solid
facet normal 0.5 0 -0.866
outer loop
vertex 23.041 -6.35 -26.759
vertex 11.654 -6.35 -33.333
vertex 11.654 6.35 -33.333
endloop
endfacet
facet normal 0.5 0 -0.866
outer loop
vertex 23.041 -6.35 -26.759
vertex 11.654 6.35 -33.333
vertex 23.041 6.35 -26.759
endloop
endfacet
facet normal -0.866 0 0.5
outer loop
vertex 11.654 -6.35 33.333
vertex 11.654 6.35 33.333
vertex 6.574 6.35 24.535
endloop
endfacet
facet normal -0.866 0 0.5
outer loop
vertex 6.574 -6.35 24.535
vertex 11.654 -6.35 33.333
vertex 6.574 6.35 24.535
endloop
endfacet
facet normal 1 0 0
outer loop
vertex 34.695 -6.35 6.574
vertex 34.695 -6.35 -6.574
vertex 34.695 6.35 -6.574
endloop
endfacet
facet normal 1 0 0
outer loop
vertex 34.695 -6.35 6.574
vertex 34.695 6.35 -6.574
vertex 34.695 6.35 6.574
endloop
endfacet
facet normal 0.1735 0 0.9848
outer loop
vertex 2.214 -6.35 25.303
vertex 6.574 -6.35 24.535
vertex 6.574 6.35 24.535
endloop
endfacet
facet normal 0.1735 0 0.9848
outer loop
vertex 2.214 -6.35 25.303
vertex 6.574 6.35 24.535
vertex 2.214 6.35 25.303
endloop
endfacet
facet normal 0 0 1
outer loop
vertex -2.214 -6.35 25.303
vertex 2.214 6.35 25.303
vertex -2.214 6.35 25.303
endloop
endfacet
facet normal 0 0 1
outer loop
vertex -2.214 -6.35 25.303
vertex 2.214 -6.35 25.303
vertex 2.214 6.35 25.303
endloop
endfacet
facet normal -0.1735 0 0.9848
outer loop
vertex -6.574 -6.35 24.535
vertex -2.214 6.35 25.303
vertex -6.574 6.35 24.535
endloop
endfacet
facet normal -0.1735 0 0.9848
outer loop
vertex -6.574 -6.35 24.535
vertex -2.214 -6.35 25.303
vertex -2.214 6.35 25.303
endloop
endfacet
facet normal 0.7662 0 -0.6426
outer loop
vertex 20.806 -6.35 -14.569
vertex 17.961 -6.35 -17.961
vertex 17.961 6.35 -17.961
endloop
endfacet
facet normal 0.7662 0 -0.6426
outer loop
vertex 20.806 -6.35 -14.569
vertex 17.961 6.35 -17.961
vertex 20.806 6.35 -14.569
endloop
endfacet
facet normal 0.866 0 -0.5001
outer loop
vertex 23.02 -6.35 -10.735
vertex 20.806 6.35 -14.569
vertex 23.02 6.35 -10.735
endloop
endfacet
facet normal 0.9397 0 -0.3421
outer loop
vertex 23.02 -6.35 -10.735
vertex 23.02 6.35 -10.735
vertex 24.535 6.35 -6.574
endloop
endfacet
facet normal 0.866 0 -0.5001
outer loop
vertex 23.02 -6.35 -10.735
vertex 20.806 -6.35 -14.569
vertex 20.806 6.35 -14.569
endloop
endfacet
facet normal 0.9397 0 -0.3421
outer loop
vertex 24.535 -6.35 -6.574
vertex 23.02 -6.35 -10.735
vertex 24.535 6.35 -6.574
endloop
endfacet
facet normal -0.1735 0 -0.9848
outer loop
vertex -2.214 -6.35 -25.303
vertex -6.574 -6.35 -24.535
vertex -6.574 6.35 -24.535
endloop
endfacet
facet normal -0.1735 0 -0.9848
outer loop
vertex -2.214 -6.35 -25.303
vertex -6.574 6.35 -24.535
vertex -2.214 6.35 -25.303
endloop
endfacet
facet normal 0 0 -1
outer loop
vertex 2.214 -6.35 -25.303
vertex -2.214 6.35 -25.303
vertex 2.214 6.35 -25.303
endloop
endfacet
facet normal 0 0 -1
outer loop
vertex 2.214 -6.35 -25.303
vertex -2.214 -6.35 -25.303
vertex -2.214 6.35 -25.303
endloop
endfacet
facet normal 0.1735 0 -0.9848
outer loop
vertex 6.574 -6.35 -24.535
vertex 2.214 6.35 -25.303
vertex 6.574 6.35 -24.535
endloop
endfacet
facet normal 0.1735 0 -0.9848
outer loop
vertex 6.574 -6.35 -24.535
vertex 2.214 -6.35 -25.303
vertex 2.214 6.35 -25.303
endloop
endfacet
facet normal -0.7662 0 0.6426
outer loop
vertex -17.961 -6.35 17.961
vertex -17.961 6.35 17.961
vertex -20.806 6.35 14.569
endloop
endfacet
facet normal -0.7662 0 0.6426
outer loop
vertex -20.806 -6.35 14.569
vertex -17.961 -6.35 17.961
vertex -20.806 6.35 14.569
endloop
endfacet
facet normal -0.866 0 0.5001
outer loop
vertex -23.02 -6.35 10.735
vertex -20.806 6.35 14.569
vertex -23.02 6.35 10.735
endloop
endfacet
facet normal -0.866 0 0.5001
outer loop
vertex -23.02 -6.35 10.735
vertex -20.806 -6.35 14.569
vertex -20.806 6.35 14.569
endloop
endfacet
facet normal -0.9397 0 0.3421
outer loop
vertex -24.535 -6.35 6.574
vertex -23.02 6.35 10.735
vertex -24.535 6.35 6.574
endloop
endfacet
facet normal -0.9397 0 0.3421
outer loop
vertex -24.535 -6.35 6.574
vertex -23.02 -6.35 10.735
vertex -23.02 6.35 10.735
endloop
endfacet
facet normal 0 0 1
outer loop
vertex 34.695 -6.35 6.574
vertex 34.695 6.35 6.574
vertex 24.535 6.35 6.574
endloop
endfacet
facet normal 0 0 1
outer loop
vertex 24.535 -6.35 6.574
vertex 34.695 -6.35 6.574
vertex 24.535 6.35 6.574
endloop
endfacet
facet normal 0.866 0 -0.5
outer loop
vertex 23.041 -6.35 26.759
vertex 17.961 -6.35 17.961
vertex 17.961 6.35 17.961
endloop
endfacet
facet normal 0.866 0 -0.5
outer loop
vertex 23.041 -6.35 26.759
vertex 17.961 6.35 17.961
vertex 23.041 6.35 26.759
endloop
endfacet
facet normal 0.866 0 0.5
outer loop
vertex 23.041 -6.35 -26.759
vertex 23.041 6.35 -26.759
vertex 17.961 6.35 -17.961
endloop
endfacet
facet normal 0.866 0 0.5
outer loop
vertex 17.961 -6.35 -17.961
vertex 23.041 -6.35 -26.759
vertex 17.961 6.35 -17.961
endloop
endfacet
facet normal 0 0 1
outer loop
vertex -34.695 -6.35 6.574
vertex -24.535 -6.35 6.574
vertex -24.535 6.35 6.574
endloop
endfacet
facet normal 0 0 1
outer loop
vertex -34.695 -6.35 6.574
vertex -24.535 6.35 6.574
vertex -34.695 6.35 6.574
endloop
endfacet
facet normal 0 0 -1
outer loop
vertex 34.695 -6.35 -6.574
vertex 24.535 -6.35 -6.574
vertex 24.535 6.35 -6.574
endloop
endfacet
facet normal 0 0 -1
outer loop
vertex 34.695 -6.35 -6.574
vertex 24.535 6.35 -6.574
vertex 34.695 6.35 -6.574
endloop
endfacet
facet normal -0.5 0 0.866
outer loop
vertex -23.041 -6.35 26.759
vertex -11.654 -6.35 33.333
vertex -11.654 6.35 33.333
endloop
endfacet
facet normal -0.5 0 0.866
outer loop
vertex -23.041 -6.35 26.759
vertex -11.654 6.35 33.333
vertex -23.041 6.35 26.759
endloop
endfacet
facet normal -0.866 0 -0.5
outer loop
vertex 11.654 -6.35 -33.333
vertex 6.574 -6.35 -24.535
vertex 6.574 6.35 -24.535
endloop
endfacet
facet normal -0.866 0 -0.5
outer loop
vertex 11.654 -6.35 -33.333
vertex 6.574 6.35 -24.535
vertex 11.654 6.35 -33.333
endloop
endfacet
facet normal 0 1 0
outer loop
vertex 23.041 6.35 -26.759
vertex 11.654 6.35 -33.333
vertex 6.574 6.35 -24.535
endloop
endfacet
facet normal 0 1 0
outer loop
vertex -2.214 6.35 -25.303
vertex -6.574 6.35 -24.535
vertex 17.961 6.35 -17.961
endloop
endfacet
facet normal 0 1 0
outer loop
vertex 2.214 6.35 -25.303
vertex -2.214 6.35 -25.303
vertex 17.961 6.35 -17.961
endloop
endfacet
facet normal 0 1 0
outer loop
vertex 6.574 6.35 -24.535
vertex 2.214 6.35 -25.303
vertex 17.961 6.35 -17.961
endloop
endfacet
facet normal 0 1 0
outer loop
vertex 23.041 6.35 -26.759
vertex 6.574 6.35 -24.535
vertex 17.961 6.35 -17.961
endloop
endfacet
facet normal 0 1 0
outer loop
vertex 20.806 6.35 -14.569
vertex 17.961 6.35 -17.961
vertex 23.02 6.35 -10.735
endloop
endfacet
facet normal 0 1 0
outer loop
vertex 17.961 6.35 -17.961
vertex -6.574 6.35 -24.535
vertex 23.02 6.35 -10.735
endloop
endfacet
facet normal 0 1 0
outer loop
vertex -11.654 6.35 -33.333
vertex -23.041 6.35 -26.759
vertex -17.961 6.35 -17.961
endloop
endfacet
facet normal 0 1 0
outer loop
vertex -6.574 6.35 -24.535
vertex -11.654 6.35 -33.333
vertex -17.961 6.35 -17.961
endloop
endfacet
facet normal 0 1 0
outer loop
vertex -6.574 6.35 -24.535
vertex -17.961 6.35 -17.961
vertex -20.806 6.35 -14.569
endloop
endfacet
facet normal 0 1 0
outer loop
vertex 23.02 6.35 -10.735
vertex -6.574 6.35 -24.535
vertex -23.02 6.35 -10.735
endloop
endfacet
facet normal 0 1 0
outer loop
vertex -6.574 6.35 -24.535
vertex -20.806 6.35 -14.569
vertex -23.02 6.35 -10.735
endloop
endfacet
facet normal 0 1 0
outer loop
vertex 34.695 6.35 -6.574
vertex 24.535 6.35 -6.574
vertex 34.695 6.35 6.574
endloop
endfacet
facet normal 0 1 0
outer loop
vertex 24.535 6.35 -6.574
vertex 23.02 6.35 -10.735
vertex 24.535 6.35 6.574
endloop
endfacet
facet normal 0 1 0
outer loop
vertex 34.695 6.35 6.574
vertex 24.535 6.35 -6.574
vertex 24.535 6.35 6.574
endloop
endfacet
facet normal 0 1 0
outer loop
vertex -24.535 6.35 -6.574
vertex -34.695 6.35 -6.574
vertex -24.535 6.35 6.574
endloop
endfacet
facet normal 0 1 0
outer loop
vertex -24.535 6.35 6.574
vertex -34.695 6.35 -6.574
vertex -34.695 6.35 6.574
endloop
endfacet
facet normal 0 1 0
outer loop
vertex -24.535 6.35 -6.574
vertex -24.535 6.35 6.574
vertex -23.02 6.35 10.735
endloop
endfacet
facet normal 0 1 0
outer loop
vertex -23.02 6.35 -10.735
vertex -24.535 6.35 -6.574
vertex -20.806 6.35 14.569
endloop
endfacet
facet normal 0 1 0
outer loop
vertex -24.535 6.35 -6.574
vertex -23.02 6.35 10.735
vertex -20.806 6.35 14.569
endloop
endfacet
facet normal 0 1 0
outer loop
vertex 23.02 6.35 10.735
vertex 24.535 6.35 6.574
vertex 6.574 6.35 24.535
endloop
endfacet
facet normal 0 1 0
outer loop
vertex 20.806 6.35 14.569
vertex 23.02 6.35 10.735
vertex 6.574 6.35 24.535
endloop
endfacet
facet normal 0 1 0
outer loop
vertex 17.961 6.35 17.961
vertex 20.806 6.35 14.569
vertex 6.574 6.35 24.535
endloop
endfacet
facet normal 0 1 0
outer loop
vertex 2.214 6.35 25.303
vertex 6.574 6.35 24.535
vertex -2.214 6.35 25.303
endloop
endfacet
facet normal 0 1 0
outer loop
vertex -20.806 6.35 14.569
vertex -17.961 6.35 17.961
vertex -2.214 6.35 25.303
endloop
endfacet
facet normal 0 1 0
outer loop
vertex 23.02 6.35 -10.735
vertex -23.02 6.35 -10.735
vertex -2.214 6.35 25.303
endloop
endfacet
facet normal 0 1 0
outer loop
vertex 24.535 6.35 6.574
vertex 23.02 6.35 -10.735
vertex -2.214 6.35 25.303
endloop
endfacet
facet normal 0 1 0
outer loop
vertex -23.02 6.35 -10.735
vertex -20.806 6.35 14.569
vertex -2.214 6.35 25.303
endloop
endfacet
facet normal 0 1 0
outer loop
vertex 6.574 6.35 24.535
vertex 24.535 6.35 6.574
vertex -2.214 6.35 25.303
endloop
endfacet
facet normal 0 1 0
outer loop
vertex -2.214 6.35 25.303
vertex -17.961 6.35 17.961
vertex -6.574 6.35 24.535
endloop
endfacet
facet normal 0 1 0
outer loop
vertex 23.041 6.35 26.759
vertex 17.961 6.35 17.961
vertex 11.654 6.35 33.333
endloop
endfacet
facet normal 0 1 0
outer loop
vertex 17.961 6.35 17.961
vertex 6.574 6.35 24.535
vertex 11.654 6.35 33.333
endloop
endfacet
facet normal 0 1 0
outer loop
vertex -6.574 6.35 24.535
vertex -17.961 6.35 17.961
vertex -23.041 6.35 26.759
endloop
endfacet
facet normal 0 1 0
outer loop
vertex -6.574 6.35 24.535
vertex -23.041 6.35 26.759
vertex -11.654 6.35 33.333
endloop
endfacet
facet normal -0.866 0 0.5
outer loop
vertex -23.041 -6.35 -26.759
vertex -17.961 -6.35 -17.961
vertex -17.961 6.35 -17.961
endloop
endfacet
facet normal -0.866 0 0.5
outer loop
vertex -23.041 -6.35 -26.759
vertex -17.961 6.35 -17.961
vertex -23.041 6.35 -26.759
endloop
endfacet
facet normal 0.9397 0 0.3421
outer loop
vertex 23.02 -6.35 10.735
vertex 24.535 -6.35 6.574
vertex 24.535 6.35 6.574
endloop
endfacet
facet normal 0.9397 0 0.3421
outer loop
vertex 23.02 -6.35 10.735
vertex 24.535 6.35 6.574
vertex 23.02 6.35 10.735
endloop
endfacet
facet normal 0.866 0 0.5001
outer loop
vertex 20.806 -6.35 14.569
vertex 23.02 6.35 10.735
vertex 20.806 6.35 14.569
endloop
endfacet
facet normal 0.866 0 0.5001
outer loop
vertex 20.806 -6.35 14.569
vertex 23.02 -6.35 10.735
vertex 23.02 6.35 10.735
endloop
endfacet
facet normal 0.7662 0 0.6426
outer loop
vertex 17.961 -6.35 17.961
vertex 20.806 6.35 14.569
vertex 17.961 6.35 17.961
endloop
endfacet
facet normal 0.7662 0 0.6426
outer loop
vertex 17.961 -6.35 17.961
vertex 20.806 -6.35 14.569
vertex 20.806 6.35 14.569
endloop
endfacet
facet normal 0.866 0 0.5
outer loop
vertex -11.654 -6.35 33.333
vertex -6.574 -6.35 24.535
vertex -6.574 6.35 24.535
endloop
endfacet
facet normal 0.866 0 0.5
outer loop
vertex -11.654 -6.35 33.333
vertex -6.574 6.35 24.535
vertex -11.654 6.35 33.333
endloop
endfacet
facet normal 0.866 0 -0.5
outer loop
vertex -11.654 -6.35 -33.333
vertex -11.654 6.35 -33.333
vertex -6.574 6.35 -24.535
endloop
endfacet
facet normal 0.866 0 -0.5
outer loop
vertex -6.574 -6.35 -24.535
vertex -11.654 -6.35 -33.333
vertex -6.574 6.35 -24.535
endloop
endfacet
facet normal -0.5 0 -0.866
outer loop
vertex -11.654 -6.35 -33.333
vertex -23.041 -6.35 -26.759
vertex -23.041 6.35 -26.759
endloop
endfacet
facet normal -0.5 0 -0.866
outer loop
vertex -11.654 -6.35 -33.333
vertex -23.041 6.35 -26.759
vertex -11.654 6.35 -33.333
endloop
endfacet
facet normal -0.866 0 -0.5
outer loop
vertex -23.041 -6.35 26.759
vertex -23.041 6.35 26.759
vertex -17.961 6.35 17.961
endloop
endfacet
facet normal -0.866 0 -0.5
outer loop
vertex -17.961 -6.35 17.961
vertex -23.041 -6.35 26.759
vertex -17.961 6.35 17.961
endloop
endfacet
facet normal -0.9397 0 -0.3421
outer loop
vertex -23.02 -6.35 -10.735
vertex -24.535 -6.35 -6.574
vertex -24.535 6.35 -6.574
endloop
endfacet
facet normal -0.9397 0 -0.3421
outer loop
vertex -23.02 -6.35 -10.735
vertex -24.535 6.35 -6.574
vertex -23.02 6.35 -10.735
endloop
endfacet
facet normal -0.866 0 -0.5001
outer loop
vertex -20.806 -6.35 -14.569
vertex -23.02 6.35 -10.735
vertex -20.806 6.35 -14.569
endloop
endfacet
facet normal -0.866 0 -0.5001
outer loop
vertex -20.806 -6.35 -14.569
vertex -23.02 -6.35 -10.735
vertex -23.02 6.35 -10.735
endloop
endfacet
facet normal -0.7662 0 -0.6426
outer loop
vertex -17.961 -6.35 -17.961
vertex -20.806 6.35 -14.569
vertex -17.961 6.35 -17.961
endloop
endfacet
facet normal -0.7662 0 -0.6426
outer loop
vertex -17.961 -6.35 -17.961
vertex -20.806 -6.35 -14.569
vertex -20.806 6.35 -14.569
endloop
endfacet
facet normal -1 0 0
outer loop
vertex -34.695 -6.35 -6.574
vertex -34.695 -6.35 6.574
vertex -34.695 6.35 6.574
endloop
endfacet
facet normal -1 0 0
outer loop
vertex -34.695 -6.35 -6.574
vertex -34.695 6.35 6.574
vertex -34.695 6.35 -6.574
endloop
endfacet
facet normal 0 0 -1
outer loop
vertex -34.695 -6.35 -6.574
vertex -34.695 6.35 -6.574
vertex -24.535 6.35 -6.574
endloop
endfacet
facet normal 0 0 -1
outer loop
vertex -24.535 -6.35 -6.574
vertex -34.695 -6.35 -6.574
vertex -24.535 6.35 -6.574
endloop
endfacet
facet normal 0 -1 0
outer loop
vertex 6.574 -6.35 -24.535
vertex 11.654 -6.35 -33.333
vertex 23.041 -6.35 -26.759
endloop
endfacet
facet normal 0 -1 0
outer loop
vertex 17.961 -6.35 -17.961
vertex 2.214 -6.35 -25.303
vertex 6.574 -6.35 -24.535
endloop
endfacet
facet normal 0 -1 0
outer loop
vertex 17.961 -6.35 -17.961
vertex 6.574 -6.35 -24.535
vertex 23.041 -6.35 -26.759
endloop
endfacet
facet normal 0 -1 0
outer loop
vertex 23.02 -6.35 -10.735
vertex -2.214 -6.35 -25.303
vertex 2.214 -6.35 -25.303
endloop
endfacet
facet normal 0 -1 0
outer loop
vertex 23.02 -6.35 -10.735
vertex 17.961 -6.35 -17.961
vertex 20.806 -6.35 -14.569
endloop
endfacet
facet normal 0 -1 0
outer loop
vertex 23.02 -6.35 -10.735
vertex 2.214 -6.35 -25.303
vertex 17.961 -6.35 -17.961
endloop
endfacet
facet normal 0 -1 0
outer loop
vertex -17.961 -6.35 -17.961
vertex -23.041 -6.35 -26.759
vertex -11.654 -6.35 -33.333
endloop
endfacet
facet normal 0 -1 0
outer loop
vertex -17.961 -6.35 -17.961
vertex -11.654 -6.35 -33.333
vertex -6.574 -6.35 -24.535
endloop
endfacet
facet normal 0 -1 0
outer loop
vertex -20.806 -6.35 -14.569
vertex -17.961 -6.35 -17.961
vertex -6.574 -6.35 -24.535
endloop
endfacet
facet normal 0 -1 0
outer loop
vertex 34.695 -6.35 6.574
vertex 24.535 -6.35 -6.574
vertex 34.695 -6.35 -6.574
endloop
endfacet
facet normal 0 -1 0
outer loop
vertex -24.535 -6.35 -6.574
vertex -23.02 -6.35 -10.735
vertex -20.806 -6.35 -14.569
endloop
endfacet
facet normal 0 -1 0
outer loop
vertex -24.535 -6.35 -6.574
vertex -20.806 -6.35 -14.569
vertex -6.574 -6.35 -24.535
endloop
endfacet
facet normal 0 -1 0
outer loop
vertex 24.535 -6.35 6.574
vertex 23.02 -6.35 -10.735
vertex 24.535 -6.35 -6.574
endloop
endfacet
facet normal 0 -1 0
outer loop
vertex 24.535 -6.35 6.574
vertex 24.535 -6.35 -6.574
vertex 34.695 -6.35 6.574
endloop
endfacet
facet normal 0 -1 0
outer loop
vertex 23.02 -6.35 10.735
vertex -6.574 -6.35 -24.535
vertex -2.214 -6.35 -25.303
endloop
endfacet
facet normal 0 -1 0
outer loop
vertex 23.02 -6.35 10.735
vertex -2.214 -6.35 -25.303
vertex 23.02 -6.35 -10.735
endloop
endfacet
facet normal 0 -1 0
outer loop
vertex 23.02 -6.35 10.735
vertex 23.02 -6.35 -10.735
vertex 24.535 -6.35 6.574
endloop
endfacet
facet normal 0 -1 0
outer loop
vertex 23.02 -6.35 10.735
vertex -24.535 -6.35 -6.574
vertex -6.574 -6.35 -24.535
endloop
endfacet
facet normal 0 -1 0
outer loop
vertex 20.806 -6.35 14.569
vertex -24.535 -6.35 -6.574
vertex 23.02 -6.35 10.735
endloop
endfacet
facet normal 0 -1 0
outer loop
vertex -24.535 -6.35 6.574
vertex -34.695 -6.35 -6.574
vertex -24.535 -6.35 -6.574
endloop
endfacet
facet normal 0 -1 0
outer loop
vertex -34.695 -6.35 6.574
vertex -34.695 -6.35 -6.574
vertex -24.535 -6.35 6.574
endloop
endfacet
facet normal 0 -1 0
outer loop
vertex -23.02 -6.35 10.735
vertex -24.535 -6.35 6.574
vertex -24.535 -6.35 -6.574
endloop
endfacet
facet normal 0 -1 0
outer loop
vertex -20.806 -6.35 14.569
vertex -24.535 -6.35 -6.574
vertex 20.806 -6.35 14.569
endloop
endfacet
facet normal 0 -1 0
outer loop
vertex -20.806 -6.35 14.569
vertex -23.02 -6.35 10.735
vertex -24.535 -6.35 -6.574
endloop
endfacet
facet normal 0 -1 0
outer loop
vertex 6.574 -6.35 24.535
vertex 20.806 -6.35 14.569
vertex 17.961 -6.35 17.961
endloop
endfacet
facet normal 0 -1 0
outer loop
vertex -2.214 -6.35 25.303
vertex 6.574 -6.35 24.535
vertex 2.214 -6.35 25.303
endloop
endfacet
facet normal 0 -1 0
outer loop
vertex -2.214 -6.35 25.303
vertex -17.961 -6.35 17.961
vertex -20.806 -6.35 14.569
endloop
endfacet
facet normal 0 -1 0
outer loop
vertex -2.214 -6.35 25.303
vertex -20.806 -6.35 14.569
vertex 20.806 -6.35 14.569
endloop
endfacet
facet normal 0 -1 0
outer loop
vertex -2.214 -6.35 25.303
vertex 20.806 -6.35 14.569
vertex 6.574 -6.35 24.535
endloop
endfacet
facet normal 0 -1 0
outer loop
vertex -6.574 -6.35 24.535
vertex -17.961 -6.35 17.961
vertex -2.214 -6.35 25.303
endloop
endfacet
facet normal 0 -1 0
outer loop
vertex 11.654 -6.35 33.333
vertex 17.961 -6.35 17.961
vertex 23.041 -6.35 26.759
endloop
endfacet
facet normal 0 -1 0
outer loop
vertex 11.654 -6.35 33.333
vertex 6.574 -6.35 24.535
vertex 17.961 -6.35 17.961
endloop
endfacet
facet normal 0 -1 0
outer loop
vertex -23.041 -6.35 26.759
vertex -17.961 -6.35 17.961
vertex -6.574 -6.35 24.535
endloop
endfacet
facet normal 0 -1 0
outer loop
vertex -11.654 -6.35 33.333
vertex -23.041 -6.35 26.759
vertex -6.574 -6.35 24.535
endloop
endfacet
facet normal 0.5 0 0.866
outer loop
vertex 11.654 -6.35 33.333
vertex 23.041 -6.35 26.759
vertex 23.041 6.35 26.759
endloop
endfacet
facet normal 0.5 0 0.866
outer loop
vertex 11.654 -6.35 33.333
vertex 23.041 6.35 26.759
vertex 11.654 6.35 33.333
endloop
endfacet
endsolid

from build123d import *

# Parameters (mm, degrees)
F0_R     = 25.4
F1_DEPTH = 6.35
F3_DEPTH = 12.7
F5_COUNT = 6


with BuildPart() as f1:
    # F0 (on Front) → F1 (new body, symmetric)
    with BuildSketch(Plane.XZ):
        Circle(F0_R)
    extrude(amount=F1_DEPTH, both=True)

    # F2 (on face) → F3 (join)
    with BuildSketch(Plane.XZ.offset(6.35)):
        Polygon((24.534516, 6.574004), (0, 0), (24.534516, 0), align=None)
        Polygon((24.534516, 0), (0, 0), (24.534516, -6.574004), align=None)
        with BuildLine():
            Line((25.4, 0), (24.534516, 0))
            Line((24.534516, 0), (24.534516, -6.574004))
            ThreePointArc((24.534516, -6.574004), (25.182699, -3.315365), (25.4, 0))
        make_face()
        with BuildLine():
            Line((24.534516, 6.574004), (24.534516, 0))
            Line((24.534516, 0), (25.4, 0))
            ThreePointArc((25.4, 0), (25.182699, 3.315365), (24.534516, 6.574004))
        make_face()
        with BuildLine():
            Line((34.694516, 6.574004), (24.534516, 6.574004))
            ThreePointArc((24.534516, 6.574004), (25.182699, 3.315365), (25.4, 0))
            ThreePointArc((25.4, 0), (25.182699, -3.315365), (24.534516, -6.574004))
            Line((24.534516, -6.574004), (34.694516, -6.574004))
            Line((34.694516, -6.574004), (34.694516, 6.574004))
        make_face()
    extrude(amount=-F3_DEPTH)

    # F5: F1 ×6 about axis
    f5_axis = Axis((0, -14.801851, 0), (0, 1, 0))


with BuildPart() as f1_1:
    add(f1.part)
    for i in range(1, F5_COUNT):
        add(f1.part.rotate(f5_axis, i * 360 / F5_COUNT))


solid = f1_1.part
